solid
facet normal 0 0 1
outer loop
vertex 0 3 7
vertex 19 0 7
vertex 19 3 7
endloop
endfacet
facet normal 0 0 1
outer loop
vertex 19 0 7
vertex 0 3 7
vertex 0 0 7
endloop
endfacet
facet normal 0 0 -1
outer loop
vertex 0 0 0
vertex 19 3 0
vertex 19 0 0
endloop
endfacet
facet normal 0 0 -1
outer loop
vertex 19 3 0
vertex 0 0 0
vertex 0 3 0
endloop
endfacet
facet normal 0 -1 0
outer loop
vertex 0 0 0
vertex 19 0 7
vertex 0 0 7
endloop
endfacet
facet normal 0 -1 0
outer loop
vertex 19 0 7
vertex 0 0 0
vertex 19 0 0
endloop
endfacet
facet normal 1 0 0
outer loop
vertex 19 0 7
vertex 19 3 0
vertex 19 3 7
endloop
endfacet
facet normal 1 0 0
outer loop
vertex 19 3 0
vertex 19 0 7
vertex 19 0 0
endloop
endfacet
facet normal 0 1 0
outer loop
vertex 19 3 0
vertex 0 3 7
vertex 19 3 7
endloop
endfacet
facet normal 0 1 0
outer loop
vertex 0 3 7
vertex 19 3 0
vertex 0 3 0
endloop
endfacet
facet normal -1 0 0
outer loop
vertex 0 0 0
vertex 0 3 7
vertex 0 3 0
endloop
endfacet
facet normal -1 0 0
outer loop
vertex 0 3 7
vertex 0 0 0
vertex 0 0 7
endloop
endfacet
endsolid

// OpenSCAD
// Generated by SolidPython 1.0.1 on 2020-07-29 00:46:56


cube(size = [19, 3, 7]);
/***********************************************
*********      SolidPython code:      **********
************************************************
 
# import packages: SolidPython
from solid import *
from solid.utils import *
from itertools import chain, combinations, permutations


class Resize:

    def __init__(self, scad_file):
        self.scad_file = scad_file
        #self.scad_file = import_scad(scad_file)
        # cone/cylinder param:
        self.r1 = 0
        self.r2 = 0
        self.h = 0
        # rectangular prism param:
        self.w = 0
        self.l = 0
        # ellipse param:
        self.r = 0

    # import OpenScad code (file name corresponds to shape)


    # classify shape + parameters
    def assign(self, param1, param2, param3):
        if self.scad_file == 'cone.scad':
            self.r1 = param1
            self.r2 = param2
            self.h = param3
        elif self.scad_file == 'cylinder.scad':
            self.r1 = param1
            self.r2 = param2
            self.h = param3
        elif self.scad_file == 'rectangularPrism.scad':
            self.h = param1
            self.l = param2
            self.w = param3
        else:
            self.r = param1
            self.h = param2

    # resize parameters
    def iterate(self):
        x = range(3, 20, 2)
        i = 1
        if self.scad_file == 'cone.scad':
            tempList = list(permutations(x, 2))
            for temp in tempList:
                param1 = temp[0]
                param2 = temp[1]
                filepath = 'produced_scad_files/' + 'cone' + str(param1) + '_' + str(param2) + '_' + '.scad'
                scad_render_to_file(cylinder(h=param1, r1=param2, r2=0), filepath)

        elif self.scad_file == 'cylinder.scad':
            tempList = list(permutations(x, 3))
            for temp in tempList:
                param1 = temp[0]
                param2 = temp[1]
                filepath = 'produced_scad_files/' + 'cylinder' + str(param1) + '_' + str(param2) + '_' + '.scad'
                scad_render_to_file(cylinder(h=param1, r1=param2, r2=param2), filepath)

        elif self.scad_file == 'rectangularPrism.scad':
            tempList = list(permutations(x, 3))
            for temp in tempList:
                param1 = temp[0]
                param2 = temp[1]
                param3 = temp[2]
                filepath = 'produced_scad_files/' + 'rectangularPrism' + str(param1) + '_' + str(param2) + '_' + str(
                    param3) + '.scad'
                scad_render_to_file(cube(size=(param1, param2, param3)), filepath)

        elif self.scad_file == 'ellipse.scad':
            tempList = list(permutations(x, 4))
            for temp in tempList:
                param1 = temp[0]
                param2 = temp[1]
                param3 = temp[2]
                param4 = temp[3]
                filepath = 'produced_scad_files/' + 'ellipse' + str(param1) + '_' + str(param2) + '_' + str(param3) + '_' + str(param4) + '.scad'
                scad_render_to_file(scale([param1, param2, param3])(sphere(r=param4)), filepath)

    def render_to_scadfile(self):
        scad_render_to_file(scad, 'example.scad') 
 
************************************************/
